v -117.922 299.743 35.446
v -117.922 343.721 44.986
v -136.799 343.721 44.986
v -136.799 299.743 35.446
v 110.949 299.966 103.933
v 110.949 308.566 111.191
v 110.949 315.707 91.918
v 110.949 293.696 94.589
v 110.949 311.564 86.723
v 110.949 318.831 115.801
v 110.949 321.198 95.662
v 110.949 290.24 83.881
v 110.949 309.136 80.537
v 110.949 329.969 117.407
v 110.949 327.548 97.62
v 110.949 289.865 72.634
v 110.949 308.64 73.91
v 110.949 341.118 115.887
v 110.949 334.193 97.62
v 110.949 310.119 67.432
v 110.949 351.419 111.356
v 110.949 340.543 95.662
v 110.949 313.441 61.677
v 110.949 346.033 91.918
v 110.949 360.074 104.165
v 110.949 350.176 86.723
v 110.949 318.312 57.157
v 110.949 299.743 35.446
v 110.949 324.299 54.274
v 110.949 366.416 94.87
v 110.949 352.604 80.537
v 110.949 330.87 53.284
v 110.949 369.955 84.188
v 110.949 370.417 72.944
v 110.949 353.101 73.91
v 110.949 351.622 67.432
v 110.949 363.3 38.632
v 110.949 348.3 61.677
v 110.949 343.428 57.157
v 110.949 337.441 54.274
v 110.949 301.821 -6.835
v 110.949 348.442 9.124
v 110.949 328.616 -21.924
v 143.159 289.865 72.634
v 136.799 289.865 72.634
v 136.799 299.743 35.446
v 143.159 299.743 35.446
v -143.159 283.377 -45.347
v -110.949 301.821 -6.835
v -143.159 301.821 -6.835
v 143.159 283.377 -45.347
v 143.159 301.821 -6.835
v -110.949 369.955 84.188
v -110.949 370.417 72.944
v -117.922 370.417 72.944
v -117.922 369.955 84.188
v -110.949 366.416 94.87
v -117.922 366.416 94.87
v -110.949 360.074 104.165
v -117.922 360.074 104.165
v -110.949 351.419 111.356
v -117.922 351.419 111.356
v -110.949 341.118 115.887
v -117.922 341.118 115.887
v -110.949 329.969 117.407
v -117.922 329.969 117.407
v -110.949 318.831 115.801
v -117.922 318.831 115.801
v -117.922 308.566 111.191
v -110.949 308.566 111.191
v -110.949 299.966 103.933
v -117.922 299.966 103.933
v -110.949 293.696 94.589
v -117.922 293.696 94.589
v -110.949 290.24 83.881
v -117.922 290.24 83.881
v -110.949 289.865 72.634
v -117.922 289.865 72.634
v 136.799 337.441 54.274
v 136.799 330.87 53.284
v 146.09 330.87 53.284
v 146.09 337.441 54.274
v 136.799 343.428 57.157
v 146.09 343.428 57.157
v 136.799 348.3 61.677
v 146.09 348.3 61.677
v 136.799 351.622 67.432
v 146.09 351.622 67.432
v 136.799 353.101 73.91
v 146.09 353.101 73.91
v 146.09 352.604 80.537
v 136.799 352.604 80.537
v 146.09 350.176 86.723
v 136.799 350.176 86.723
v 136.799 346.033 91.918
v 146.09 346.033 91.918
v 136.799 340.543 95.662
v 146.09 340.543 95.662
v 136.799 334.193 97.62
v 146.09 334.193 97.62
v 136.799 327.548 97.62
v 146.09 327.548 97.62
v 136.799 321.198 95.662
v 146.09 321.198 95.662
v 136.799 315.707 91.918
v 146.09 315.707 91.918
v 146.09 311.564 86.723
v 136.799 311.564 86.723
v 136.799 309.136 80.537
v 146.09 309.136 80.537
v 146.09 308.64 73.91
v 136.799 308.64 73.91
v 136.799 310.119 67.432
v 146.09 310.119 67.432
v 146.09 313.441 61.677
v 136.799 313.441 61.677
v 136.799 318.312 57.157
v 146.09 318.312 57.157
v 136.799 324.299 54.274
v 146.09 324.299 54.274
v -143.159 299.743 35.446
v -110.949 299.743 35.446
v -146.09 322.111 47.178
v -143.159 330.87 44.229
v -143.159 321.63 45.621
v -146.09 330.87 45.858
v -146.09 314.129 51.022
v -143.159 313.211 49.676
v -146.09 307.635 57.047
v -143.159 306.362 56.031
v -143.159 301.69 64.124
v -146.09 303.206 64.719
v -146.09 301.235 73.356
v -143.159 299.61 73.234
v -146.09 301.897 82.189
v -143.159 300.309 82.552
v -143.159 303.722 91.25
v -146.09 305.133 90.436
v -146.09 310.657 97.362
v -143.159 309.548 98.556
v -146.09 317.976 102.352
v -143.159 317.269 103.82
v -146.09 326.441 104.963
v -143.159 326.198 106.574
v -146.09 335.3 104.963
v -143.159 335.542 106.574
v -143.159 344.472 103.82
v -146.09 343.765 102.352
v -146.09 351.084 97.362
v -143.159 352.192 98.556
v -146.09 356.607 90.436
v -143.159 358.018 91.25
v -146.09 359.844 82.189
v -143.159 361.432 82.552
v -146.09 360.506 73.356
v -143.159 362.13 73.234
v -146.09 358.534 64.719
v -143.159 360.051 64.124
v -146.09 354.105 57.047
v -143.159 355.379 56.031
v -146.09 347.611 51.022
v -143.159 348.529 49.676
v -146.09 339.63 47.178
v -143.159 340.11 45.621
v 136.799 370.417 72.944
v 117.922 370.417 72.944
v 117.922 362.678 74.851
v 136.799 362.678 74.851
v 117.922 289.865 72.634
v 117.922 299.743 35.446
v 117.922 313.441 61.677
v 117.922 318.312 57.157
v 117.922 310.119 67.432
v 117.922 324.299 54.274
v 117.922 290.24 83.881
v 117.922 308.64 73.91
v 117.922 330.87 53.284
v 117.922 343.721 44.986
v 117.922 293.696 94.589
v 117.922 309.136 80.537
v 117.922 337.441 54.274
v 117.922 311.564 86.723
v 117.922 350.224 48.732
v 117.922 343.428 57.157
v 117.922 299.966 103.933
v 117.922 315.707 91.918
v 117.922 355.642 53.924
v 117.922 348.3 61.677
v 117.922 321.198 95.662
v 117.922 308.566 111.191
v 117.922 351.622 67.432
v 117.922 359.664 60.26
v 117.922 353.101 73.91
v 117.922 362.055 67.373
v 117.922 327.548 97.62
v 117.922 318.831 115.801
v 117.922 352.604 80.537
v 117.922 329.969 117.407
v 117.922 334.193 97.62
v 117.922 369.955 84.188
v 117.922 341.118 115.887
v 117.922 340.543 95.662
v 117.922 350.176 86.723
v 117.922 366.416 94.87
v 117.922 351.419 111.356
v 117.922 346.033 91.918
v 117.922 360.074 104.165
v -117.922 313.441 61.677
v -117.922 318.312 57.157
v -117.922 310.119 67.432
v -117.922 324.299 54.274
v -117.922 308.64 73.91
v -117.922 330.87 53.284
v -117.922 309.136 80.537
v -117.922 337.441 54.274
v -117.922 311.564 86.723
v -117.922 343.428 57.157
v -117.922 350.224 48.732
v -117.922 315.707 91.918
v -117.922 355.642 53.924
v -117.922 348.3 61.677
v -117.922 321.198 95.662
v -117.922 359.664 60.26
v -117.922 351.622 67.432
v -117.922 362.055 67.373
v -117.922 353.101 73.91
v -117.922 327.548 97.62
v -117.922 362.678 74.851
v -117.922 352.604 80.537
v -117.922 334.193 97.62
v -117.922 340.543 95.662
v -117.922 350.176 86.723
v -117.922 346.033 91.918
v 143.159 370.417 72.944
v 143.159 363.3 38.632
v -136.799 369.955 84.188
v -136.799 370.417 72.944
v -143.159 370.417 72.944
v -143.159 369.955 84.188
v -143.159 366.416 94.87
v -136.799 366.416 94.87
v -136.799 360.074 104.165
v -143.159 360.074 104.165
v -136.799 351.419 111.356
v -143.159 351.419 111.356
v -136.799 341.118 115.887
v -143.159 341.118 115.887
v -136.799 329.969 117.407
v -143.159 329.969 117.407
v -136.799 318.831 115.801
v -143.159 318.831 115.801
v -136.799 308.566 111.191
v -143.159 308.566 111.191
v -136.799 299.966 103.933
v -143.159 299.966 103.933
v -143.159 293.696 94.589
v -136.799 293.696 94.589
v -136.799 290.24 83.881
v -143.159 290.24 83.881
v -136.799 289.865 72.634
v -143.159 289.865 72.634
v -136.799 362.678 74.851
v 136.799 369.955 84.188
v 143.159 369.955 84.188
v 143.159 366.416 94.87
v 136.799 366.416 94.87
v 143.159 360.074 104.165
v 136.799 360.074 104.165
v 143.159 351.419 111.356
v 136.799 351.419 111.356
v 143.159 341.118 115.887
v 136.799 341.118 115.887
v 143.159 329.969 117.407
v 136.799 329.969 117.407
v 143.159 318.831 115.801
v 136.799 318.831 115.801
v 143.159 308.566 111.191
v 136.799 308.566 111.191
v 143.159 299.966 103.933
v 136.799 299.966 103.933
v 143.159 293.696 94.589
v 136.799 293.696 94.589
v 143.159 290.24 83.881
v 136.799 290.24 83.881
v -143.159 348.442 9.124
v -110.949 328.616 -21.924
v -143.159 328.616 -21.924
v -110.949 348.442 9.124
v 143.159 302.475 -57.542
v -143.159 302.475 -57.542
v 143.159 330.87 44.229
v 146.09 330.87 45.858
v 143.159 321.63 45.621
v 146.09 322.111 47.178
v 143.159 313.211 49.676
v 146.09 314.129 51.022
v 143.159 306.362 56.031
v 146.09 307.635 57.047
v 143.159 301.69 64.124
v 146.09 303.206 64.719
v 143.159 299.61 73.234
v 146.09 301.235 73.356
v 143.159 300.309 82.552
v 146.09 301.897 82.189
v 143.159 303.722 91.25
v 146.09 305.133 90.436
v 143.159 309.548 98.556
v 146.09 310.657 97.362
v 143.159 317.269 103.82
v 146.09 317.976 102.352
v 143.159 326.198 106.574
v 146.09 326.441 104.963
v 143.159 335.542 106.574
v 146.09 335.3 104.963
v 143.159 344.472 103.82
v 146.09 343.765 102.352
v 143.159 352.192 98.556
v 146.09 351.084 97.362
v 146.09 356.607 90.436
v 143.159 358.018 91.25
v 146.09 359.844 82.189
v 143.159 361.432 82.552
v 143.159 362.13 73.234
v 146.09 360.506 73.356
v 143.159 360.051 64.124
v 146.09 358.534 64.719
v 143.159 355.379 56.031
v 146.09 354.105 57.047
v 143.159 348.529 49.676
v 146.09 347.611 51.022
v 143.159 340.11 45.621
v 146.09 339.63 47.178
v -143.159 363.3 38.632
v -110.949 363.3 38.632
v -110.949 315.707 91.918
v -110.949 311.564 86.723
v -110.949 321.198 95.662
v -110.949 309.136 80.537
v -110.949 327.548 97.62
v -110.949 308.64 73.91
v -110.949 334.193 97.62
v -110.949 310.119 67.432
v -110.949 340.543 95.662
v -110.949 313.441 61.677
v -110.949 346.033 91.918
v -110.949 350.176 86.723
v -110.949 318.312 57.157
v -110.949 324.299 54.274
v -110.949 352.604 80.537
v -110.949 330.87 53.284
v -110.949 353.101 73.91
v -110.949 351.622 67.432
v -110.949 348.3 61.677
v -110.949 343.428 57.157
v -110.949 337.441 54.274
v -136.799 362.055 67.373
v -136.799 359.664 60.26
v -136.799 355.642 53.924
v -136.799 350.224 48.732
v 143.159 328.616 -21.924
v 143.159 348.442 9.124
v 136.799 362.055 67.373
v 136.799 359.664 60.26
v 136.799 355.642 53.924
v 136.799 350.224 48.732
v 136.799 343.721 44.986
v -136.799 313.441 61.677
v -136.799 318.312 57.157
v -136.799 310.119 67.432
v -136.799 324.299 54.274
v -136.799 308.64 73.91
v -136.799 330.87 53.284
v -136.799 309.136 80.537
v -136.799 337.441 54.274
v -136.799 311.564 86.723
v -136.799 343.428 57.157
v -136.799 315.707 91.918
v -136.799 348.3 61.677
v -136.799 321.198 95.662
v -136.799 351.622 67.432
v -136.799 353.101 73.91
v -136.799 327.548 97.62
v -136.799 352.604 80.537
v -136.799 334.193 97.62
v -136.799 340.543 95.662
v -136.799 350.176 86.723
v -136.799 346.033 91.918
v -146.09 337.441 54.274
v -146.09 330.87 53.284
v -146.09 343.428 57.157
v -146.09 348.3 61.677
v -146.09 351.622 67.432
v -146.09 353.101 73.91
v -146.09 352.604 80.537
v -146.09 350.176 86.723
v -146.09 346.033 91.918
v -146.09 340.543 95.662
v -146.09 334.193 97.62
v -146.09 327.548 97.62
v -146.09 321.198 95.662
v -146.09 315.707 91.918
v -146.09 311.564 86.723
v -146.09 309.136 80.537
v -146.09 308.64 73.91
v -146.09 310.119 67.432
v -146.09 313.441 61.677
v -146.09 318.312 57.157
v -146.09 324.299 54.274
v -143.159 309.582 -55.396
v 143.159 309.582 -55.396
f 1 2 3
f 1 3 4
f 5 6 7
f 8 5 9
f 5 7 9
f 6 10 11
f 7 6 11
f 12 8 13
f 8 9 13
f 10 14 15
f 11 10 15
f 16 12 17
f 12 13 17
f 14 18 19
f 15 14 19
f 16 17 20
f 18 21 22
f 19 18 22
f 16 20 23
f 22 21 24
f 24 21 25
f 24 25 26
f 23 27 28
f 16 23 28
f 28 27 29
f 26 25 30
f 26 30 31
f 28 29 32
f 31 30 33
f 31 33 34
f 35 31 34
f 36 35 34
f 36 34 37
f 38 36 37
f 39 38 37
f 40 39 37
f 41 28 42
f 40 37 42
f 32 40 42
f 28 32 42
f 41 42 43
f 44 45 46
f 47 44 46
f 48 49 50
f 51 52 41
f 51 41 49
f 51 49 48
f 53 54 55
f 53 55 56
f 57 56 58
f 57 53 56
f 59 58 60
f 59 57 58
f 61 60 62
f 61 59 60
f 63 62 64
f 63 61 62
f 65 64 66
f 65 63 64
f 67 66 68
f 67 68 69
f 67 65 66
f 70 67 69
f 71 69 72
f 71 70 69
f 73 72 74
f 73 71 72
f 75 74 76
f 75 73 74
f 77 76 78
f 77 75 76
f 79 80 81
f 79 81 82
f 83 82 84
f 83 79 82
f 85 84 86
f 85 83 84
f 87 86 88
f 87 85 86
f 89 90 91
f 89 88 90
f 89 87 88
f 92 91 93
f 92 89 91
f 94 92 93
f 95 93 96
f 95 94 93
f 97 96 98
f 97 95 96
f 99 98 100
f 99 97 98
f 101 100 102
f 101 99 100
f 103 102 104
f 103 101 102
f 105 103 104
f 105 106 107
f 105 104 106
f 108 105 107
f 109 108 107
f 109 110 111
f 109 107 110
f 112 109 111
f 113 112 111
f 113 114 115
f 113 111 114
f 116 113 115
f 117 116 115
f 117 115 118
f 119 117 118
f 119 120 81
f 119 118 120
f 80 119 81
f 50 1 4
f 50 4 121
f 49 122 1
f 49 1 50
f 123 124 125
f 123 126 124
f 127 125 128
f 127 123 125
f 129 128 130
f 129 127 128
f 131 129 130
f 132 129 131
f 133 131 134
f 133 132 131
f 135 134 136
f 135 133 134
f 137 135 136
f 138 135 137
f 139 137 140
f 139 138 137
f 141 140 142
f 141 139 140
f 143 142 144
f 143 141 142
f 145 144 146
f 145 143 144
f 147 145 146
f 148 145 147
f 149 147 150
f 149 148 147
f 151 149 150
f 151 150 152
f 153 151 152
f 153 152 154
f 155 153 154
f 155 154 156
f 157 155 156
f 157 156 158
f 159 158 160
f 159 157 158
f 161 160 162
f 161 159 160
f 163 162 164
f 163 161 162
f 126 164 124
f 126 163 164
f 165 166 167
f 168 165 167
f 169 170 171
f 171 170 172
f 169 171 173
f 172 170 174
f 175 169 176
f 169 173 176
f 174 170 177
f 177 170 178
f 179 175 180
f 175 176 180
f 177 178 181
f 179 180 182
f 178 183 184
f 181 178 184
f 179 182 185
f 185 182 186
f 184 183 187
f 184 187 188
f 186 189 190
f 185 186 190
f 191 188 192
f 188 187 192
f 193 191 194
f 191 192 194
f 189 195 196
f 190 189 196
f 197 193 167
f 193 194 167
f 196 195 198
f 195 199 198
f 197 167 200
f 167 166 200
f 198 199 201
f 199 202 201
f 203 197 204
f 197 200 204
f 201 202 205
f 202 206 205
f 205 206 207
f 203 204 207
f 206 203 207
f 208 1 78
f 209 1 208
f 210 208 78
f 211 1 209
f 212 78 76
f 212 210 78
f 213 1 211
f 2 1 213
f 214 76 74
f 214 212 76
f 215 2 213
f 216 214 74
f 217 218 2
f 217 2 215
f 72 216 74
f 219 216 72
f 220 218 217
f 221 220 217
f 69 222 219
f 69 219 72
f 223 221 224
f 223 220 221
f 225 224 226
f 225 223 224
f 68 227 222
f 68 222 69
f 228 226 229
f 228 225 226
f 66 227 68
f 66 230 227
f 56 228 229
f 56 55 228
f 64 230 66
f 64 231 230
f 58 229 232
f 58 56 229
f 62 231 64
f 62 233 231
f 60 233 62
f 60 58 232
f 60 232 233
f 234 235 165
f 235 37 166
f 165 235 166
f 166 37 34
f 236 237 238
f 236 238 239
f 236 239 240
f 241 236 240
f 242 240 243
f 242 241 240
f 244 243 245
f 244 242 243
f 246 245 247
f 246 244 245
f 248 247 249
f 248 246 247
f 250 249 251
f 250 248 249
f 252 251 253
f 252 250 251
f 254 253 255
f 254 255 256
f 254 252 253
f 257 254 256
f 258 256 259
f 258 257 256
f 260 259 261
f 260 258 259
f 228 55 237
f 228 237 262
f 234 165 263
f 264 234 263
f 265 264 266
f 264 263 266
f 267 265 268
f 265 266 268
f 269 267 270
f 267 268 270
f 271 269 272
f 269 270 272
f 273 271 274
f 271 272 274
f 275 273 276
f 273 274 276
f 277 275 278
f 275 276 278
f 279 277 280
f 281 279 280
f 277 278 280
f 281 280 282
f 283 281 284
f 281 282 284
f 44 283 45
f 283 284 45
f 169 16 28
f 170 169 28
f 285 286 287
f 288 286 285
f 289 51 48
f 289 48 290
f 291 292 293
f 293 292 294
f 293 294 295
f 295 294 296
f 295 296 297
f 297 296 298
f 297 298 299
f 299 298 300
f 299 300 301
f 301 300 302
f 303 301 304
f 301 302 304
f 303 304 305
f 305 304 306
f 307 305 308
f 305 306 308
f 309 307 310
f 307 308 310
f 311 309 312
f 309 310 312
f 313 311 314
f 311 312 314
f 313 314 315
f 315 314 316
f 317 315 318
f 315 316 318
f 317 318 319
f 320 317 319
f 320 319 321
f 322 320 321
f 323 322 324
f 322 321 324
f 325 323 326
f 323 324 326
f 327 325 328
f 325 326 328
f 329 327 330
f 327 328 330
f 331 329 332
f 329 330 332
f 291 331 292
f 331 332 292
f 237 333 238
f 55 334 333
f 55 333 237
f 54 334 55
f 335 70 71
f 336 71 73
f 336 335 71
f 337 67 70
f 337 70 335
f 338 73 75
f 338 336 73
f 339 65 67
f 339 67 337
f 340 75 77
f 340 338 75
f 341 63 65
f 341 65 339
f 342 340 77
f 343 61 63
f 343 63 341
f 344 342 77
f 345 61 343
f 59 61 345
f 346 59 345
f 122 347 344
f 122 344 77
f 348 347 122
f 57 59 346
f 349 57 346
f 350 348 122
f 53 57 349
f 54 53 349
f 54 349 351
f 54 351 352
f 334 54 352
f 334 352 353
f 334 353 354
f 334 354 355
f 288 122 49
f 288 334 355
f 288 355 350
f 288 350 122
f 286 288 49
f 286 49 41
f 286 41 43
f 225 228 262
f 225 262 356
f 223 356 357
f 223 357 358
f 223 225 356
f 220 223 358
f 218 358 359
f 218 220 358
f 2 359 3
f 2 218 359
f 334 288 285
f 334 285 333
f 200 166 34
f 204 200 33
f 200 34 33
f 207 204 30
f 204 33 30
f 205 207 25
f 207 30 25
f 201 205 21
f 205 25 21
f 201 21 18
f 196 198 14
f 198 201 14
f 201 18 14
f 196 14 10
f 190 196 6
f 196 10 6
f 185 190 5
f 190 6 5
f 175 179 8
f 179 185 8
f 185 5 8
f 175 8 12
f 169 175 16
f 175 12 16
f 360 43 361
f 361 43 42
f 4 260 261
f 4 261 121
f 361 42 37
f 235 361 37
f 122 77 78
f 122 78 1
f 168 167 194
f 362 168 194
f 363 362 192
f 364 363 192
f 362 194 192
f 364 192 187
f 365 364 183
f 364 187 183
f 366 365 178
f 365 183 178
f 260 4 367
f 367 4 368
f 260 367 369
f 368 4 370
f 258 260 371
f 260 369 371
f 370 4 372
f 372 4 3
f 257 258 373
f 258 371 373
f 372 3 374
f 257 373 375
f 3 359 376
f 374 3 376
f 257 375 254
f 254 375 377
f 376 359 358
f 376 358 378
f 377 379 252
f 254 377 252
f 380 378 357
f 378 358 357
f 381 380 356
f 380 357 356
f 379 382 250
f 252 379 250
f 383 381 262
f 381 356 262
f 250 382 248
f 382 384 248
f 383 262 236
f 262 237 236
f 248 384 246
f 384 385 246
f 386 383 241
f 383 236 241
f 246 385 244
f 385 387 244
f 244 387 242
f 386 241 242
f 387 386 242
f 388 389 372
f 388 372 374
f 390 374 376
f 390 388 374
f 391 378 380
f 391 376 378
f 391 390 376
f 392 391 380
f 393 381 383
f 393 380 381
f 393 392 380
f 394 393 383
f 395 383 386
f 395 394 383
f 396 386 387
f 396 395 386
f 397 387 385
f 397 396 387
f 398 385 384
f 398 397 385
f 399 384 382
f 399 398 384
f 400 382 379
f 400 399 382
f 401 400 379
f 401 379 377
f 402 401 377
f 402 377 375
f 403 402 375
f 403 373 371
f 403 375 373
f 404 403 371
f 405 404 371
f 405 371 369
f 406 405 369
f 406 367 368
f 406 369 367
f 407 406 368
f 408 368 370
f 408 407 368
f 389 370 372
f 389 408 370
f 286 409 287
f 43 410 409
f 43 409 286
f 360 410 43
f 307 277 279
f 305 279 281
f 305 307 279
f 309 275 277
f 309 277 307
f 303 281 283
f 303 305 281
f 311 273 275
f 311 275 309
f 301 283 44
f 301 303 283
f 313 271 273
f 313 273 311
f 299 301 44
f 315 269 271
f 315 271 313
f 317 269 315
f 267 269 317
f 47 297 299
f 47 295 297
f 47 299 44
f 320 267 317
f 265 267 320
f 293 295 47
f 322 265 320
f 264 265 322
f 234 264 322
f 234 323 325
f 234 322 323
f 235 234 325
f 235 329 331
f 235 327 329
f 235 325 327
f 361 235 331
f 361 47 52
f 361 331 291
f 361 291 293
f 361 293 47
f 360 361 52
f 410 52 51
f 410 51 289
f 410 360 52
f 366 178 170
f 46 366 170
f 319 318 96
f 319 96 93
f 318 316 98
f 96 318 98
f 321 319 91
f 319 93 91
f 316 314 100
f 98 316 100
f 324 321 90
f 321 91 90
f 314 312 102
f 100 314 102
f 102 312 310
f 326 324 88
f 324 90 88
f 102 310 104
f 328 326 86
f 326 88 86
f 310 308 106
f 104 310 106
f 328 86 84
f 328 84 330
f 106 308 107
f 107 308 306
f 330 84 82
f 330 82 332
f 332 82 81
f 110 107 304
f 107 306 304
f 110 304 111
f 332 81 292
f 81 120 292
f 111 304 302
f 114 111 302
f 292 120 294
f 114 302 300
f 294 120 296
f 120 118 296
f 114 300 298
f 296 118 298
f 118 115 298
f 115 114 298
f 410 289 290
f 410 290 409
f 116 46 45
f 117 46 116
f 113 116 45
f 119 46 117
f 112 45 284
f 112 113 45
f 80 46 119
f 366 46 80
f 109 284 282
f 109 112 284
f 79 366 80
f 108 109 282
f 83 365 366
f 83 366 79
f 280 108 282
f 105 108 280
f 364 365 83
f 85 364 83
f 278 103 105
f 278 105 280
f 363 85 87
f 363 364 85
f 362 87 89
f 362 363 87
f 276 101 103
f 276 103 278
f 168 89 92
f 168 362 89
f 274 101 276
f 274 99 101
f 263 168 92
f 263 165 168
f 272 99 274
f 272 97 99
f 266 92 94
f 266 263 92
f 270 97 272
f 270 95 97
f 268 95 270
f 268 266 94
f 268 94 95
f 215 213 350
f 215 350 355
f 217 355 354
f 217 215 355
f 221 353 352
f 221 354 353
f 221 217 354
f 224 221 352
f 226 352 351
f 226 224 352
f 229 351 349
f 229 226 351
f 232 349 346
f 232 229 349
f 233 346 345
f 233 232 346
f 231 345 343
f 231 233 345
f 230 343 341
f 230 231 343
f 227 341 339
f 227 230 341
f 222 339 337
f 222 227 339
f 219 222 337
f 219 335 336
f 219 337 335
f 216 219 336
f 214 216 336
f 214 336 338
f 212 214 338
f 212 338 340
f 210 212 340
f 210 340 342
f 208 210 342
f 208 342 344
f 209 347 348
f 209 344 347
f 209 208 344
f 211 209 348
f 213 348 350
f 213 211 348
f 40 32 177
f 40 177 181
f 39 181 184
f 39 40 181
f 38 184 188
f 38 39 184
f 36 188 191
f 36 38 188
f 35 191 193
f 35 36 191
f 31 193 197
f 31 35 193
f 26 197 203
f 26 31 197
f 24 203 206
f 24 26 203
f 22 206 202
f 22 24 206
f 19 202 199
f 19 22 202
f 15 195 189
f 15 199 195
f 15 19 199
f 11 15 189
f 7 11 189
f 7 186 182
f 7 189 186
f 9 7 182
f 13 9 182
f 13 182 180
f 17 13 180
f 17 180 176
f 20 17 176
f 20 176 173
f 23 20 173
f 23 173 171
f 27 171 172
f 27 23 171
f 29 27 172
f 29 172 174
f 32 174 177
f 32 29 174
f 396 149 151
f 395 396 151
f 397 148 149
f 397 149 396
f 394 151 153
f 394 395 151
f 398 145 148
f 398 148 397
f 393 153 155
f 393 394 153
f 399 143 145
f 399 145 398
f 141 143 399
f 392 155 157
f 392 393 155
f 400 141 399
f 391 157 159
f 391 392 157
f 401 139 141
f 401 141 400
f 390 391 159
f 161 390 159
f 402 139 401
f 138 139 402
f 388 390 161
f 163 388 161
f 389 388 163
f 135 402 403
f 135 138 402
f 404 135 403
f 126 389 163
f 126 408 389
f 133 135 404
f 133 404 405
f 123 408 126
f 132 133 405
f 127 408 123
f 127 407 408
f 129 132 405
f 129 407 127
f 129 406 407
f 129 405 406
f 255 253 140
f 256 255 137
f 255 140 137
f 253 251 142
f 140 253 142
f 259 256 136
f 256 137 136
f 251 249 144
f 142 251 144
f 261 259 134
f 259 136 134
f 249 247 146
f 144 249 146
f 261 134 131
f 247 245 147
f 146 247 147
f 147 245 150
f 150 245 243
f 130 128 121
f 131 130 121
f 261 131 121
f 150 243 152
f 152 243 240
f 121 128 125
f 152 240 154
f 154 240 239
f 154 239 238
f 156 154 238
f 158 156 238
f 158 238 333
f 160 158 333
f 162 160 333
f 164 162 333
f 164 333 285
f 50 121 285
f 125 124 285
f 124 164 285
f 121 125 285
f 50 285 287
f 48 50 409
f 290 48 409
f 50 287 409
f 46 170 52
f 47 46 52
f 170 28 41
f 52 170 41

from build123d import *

# Parameters (mm, degrees)
BOSS_EXTRUDE1_DEPTH      = 110.9489018
BOSS_EXTRUDE1_DEPTH_BACK = 110.9489018
BOSS_EXTRUDE2_DEPTH      = 32.209994
CUT_EXTRUDE1_DEPTH       = 18.876772
CUT_EXTRUDE2_DEPTH       = 416.307857918
CUT_EXTRUDE2_DEPTH_BACK  = 416.307857918
SKETCH5_R                = 22.292778643


with BuildPart() as part:
    # Sketch1 → Boss-Extrude1 (new, two sides: drawn at the far end of the back side and taken through both)
    with BuildSketch(Plane(origin=(0, 0, 0), x_dir=(0, 0, -1), z_dir=(1, 0, 0)).offset(-BOSS_EXTRUDE1_DEPTH_BACK)):
        Polygon((6.83514, 301.821342), (21.92401, 328.61631), (55.395622, 309.582058), (57.54243, 302.475138), (45.347128, 283.376878), align=None)
    extrude(amount=BOSS_EXTRUDE1_DEPTH + BOSS_EXTRUDE1_DEPTH_BACK)

    # Sketch2 → Boss-Extrude2 (add)
    with BuildSketch(Plane(origin=(110.9489018, 0, 0), x_dir=(0, 0, -1), z_dir=(1, 0, 0))):
        with BuildLine():
            Line((6.83514, 301.821342), (45.347128, 283.376878))
            Line((45.347128, 283.376878), (57.54243, 302.475138))
            Line((57.54243, 302.475138), (55.395622, 309.582058))
            Line((55.395622, 309.582058), (21.92401, 328.61631))
            Line((21.92401, 328.61631), (-9.123759242, 348.442038748))
            Line((-9.123759242, 348.442038748), (-38.632384, 363.30001))
            Line((-38.632384, 363.30001), (-72.944482, 370.416836))
            ThreePointArc((-72.944482, 370.416836), (-117.407477991, 329.968892479), (-72.634094, 289.8648))
            Line((-72.634094, 289.8648), (-35.4457, 299.743114))
            Line((-35.4457, 299.743114), (6.83514, 301.821342))
        make_face()
    boss_extrude2 = extrude(amount=BOSS_EXTRUDE2_DEPTH)

    # Sketch3 → Cut-Extrude1 (cut)
    with BuildSketch(Plane(origin=(117.9218622, 0, 0), x_dir=(0, 0, -1), z_dir=(1, 0, 0))):
        with BuildLine():
            Line((-72.944482, 370.416836), (-74.851006, 362.67771))
            ThreePointArc((-74.851006, 362.67771), (-56.970321512, 357.844301113), (-44.98594, 343.721436))
            Line((-44.98594, 343.721436), (-35.4457, 299.743114))
            Line((-35.4457, 299.743114), (-71.143283627, 263.85225615))
            Line((-71.143283627, 263.85225615), (-147.020328304, 329.117126747))
            Line((-147.020328304, 329.117126747), (-87.829159197, 385.301513197))
            Line((-87.829159197, 385.301513197), (-72.944482, 370.416836))
        make_face()
    cut_extrude1 = extrude(amount=CUT_EXTRUDE1_DEPTH, mode=Mode.SUBTRACT)

    # Sketch4 → Revolve1 (revolve)
    with BuildSketch(Plane.XY.offset(75.57643), mode=Mode.PRIVATE) as revolve1_sk:
        Polygon((141.481302, 363.150404), (146.090386, 360.588814), (146.090386, 330.870306), (141.481302, 330.870306), align=None)
    revolve1 = revolve(revolve1_sk.sketch.rotate(Axis((146.090386, 330.870306, 75.57643), (-1, 0, 0)), 90), axis=Axis((146.090386, 330.870306, 75.57643), (-1, 0, 0)))

    # Mirror1: Boss-Extrude2, Cut-Extrude1, Revolve1 across plane
    add(boss_extrude2.mirror(Plane(origin=(0, 0, 0), x_dir=(0, 0, 1), z_dir=(1, 0, 0))))
    add(cut_extrude1.mirror(Plane(origin=(0, 0, 0), x_dir=(0, 0, 1), z_dir=(1, 0, 0))), mode=Mode.SUBTRACT)
    add(revolve1.mirror(Plane(origin=(0, 0, 0), x_dir=(0, 0, 1), z_dir=(1, 0, 0))))

    # Sketch5 → Cut-Extrude2 (cut, two sides: drawn at the far end of the back side and taken through both)
    with BuildSketch(Plane(origin=(0, 0, 0), x_dir=(0, 0, -1), z_dir=(1, 0, 0)).offset(-CUT_EXTRUDE2_DEPTH_BACK)):
        with Locations((-75.57643, 330.870306)):
            Circle(SKETCH5_R)
    extrude(amount=CUT_EXTRUDE2_DEPTH + CUT_EXTRUDE2_DEPTH_BACK, mode=Mode.SUBTRACT)


solid = part.part
